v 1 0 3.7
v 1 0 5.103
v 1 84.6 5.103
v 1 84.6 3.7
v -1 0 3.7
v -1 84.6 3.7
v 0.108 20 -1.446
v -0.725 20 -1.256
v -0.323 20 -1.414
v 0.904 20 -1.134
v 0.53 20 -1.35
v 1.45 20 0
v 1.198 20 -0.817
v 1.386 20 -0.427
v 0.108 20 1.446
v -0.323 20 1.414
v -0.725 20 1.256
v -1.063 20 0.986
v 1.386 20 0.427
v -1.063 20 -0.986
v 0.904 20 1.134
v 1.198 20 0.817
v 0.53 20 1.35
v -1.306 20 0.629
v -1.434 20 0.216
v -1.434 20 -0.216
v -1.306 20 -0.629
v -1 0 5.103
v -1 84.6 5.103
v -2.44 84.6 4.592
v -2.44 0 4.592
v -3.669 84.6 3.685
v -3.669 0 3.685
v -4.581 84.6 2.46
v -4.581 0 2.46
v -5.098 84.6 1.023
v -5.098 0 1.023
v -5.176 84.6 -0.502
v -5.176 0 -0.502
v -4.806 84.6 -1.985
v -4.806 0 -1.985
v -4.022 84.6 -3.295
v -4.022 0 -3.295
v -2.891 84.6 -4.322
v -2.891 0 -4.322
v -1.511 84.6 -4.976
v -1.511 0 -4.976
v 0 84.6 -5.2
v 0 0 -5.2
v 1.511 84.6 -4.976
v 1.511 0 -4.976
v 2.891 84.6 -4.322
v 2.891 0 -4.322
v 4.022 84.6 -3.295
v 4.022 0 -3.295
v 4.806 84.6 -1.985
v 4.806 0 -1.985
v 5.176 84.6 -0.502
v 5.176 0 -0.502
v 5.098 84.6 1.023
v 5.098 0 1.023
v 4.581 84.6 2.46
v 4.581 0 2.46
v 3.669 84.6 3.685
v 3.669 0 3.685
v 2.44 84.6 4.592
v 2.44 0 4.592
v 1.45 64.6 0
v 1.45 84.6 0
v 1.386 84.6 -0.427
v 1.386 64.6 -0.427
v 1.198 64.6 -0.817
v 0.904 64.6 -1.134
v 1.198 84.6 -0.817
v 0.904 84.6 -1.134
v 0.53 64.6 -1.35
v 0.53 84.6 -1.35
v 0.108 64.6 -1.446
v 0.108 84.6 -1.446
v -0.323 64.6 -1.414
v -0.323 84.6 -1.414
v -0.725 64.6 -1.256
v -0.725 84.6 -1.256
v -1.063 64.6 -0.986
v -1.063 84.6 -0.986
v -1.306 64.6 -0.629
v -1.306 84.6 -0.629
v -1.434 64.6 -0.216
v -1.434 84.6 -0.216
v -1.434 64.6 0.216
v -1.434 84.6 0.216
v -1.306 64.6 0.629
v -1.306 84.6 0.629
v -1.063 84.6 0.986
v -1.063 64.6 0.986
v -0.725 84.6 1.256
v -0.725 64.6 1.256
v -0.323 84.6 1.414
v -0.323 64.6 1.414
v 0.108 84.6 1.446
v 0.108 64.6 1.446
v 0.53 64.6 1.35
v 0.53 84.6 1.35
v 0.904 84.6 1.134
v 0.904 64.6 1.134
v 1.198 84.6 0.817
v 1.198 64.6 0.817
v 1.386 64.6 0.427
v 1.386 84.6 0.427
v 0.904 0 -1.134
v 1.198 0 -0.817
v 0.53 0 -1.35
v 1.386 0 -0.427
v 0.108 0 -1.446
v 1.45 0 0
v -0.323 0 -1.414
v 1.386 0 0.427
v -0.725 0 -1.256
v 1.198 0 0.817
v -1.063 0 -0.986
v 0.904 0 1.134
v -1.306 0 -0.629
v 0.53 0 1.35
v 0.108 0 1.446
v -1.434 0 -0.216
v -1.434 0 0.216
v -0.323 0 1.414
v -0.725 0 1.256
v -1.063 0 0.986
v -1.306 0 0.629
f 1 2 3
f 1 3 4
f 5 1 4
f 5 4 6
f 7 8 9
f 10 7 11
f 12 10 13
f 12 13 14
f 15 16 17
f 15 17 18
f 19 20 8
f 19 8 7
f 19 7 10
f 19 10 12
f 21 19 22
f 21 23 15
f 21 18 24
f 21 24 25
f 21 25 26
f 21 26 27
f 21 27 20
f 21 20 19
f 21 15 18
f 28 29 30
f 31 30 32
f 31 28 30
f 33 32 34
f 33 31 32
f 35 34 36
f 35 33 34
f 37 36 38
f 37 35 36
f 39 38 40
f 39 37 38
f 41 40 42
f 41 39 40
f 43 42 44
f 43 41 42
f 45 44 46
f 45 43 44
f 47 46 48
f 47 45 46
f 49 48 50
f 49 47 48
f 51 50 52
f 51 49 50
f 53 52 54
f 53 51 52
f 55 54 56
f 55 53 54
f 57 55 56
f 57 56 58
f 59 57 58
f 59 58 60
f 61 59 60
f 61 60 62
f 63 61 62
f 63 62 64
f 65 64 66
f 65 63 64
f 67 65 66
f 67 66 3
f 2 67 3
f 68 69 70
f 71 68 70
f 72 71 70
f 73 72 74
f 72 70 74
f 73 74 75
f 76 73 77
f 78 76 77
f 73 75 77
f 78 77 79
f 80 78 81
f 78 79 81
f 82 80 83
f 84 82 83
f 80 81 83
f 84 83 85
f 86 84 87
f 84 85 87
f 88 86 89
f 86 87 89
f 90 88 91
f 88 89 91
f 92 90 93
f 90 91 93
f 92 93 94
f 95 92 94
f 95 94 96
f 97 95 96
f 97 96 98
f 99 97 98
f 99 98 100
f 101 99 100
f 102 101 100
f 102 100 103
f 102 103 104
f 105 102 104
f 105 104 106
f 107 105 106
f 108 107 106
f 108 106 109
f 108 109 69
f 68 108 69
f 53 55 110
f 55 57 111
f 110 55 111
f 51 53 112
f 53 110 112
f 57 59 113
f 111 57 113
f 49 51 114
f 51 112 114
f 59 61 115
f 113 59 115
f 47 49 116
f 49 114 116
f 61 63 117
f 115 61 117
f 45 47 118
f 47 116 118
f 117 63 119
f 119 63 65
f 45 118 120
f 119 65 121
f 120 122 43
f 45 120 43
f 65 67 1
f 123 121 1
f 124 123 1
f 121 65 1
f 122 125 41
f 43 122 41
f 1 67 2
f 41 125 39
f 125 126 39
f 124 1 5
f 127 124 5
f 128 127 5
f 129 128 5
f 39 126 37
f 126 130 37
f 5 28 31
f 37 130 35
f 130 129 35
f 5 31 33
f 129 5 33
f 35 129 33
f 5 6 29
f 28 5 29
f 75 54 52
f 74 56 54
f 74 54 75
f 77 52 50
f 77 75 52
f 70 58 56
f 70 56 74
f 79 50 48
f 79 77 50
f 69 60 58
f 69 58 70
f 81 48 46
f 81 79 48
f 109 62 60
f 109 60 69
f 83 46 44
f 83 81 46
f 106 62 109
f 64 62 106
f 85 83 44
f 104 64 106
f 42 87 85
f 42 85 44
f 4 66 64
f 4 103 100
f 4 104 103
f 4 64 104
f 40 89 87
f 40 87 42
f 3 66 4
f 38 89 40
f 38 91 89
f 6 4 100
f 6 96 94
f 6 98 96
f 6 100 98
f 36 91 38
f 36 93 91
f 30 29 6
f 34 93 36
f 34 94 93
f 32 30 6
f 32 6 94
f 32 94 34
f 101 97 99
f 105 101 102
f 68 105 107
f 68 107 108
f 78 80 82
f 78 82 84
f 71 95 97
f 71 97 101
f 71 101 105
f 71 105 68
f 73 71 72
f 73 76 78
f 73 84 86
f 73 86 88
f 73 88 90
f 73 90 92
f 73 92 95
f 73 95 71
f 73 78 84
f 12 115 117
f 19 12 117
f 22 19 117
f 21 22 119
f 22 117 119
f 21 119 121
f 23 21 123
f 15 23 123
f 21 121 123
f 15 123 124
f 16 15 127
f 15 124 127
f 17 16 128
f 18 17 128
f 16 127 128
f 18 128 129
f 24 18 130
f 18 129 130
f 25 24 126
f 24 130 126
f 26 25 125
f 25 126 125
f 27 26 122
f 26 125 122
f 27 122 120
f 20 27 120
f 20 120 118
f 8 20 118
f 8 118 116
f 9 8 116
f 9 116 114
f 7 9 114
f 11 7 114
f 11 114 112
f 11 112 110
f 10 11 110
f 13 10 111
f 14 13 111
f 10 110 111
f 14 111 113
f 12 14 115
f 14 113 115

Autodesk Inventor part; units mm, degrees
ref_plane "YZ Plane" through (0, 0, 0) normal (1, 0, 0) x (0, 1, 0)
ref_plane "XZ Plane" through (0, 0, 0) normal (0, 1, 0) x (-1, 0, 0)
ref_plane "XY Plane" through (0, 0, 0) normal (0, 0, 1) x (1, 0, 0)
sketch "Sketch1" plane through (0, 0, 0) normal (0, 1, 0) x (-1, 0, 0)
  circle A0 centre (0, 0) radius 5.2
  line L0 (1, 6.7) -> (-1, 6.7)
  line L1 (-1, 6.7) -> (-1, 3.7)
  line L2 (-1, 3.7) -> (1, 3.7)
  line L3 (1, 3.7) -> (1, 6.7)
  line L4 (1, 6.7) -> (-1, 3.7) construction
  line L5 (-1, 6.7) -> (1, 3.7) construction
  point P0 (0, 5.2)
  point P1 (1, 5.1029)
  point P2 (-1, 5.1029)
  dimension "d0" = 10.4
  dimension "d1" = 2
  dimension "d2" = 3
extrude "Extrusion1" add sketch "Sketch1" along normal blind 84.6 contours A0 L1 L2 L3 picked at (-0.1628, 0.741)
sketch "Sketch2" plane through (0, 84.6, 0) normal (0, 1, 0) x (1, 0, 0)
  circle A0 centre (0, 0) radius 1.45
  dimension "d5" = 2.9
extrude "Extrusion2" cut sketch "Sketch2" against normal blind 20
sketch "Sketch3" plane through (0, 0, 0) normal (0, -1, 0) x (1, 0, 0)
  circle A0 centre (0, 0) radius 1.45 projected
extrude "Extrusion3" cut sketch "Sketch3" against normal blind 20
properties part number "00_Battery_AAA_Attrap"
